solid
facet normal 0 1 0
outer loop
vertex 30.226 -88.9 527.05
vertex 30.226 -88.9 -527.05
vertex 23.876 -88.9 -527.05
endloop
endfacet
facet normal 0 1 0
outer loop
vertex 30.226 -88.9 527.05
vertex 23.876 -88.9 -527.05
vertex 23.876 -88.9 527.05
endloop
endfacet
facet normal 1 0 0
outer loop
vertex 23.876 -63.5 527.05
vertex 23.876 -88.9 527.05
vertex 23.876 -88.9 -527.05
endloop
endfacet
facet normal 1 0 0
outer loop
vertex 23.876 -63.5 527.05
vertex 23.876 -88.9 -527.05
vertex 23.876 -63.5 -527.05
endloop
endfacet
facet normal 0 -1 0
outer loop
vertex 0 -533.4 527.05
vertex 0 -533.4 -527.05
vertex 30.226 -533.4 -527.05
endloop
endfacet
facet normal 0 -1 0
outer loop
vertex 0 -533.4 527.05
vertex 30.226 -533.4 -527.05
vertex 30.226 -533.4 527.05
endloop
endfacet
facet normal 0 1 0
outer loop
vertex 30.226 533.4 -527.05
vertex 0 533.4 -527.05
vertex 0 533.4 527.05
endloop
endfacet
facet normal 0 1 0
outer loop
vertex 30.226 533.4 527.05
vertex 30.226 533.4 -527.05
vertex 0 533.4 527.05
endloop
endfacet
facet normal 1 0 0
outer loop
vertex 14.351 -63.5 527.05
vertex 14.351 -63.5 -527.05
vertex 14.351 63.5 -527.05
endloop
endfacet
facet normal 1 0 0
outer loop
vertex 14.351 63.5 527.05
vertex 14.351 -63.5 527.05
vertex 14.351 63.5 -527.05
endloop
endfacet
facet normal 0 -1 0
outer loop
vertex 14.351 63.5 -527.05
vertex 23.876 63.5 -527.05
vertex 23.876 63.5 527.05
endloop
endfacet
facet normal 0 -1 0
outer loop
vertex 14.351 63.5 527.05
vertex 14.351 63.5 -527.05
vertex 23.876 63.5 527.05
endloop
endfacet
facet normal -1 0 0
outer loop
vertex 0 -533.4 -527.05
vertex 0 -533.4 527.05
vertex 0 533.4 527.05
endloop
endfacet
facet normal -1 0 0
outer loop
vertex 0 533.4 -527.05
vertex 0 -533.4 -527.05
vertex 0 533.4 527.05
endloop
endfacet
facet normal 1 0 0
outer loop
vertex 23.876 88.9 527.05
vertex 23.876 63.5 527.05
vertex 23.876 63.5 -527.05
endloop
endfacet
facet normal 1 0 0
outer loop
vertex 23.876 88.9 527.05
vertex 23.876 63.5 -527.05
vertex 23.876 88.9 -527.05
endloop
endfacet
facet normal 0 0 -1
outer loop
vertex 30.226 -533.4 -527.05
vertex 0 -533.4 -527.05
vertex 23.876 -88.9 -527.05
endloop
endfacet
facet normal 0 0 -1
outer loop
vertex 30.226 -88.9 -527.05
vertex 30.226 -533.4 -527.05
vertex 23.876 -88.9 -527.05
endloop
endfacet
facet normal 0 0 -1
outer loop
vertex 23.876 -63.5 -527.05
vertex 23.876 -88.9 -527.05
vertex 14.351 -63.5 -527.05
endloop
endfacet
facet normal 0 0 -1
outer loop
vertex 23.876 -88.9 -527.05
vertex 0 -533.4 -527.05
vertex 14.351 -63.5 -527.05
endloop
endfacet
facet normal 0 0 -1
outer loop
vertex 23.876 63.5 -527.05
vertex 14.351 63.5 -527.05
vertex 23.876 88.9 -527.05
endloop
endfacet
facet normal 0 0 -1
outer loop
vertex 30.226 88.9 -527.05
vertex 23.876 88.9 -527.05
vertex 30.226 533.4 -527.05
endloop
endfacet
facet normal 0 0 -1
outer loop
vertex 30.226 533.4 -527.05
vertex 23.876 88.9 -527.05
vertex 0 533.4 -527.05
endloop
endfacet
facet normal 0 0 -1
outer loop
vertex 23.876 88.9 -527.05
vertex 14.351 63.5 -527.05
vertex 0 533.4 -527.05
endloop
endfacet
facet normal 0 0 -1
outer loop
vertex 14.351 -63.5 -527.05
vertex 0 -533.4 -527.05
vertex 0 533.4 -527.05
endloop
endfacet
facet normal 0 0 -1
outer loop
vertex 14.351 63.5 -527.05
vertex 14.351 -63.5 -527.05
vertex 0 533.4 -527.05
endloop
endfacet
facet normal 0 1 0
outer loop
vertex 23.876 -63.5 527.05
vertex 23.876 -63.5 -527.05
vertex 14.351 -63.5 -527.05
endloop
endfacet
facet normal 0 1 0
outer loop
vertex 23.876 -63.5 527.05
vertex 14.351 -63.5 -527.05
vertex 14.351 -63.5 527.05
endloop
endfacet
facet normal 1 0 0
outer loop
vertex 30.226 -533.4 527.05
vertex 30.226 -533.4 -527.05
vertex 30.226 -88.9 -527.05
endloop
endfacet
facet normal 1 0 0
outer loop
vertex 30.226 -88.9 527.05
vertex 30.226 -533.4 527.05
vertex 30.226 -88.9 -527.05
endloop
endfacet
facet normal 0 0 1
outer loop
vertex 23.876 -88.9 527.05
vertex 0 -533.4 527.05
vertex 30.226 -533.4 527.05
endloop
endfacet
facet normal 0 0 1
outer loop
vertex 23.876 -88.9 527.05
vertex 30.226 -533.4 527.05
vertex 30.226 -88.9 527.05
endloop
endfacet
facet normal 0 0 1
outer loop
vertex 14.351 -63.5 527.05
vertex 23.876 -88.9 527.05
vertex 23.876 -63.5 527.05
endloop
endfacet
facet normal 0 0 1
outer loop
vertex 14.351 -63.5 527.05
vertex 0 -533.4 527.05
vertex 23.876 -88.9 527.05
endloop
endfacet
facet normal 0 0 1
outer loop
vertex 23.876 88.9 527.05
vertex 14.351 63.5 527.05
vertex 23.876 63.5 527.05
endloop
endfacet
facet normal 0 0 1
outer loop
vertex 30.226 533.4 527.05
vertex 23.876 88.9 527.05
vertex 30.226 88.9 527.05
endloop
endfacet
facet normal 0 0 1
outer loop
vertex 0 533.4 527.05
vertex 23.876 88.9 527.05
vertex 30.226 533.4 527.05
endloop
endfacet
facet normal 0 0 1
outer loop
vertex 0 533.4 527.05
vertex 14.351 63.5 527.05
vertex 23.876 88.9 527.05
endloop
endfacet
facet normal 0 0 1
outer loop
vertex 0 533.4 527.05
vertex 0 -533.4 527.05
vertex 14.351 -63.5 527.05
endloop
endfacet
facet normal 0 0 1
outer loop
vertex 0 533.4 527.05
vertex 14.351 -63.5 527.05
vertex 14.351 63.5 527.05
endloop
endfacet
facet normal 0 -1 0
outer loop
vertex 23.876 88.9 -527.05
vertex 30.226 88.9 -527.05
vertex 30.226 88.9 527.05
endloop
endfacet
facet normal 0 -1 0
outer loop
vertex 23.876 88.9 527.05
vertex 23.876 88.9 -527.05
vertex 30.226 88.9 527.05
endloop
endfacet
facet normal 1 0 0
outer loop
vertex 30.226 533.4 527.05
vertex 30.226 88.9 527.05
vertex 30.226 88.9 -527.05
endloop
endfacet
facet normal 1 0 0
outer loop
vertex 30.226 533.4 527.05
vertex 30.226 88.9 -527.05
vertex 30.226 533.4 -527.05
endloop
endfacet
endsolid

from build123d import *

# Parameters (mm, degrees)
F0_W     = 1066.8
F0_H     = 1054.1
F1_DEPTH = 30.226
F2_W     = 177.8
F2_H     = 1054.1
F3_DEPTH = 6.35
F4_W     = 127
F4_H     = 1054.1
F5_DEPTH = 9.525


with BuildPart() as f1:
    # F0 (on Right) → F1 (new body)
    with BuildSketch(Plane.YZ):
        Rectangle(F0_W, F0_H)
    extrude(amount=F1_DEPTH)

    # F2 (on face) → F3 (cut)
    with BuildSketch(Plane.YZ.offset(30.226)):
        Rectangle(F2_W, F2_H)
    extrude(amount=-F3_DEPTH, mode=Mode.SUBTRACT)

    # F4 (on face) → F5 (cut)
    with BuildSketch(Plane.YZ.offset(23.876)):
        Rectangle(F4_W, F4_H)
    extrude(amount=-F5_DEPTH, mode=Mode.SUBTRACT)


solid = f1.part
